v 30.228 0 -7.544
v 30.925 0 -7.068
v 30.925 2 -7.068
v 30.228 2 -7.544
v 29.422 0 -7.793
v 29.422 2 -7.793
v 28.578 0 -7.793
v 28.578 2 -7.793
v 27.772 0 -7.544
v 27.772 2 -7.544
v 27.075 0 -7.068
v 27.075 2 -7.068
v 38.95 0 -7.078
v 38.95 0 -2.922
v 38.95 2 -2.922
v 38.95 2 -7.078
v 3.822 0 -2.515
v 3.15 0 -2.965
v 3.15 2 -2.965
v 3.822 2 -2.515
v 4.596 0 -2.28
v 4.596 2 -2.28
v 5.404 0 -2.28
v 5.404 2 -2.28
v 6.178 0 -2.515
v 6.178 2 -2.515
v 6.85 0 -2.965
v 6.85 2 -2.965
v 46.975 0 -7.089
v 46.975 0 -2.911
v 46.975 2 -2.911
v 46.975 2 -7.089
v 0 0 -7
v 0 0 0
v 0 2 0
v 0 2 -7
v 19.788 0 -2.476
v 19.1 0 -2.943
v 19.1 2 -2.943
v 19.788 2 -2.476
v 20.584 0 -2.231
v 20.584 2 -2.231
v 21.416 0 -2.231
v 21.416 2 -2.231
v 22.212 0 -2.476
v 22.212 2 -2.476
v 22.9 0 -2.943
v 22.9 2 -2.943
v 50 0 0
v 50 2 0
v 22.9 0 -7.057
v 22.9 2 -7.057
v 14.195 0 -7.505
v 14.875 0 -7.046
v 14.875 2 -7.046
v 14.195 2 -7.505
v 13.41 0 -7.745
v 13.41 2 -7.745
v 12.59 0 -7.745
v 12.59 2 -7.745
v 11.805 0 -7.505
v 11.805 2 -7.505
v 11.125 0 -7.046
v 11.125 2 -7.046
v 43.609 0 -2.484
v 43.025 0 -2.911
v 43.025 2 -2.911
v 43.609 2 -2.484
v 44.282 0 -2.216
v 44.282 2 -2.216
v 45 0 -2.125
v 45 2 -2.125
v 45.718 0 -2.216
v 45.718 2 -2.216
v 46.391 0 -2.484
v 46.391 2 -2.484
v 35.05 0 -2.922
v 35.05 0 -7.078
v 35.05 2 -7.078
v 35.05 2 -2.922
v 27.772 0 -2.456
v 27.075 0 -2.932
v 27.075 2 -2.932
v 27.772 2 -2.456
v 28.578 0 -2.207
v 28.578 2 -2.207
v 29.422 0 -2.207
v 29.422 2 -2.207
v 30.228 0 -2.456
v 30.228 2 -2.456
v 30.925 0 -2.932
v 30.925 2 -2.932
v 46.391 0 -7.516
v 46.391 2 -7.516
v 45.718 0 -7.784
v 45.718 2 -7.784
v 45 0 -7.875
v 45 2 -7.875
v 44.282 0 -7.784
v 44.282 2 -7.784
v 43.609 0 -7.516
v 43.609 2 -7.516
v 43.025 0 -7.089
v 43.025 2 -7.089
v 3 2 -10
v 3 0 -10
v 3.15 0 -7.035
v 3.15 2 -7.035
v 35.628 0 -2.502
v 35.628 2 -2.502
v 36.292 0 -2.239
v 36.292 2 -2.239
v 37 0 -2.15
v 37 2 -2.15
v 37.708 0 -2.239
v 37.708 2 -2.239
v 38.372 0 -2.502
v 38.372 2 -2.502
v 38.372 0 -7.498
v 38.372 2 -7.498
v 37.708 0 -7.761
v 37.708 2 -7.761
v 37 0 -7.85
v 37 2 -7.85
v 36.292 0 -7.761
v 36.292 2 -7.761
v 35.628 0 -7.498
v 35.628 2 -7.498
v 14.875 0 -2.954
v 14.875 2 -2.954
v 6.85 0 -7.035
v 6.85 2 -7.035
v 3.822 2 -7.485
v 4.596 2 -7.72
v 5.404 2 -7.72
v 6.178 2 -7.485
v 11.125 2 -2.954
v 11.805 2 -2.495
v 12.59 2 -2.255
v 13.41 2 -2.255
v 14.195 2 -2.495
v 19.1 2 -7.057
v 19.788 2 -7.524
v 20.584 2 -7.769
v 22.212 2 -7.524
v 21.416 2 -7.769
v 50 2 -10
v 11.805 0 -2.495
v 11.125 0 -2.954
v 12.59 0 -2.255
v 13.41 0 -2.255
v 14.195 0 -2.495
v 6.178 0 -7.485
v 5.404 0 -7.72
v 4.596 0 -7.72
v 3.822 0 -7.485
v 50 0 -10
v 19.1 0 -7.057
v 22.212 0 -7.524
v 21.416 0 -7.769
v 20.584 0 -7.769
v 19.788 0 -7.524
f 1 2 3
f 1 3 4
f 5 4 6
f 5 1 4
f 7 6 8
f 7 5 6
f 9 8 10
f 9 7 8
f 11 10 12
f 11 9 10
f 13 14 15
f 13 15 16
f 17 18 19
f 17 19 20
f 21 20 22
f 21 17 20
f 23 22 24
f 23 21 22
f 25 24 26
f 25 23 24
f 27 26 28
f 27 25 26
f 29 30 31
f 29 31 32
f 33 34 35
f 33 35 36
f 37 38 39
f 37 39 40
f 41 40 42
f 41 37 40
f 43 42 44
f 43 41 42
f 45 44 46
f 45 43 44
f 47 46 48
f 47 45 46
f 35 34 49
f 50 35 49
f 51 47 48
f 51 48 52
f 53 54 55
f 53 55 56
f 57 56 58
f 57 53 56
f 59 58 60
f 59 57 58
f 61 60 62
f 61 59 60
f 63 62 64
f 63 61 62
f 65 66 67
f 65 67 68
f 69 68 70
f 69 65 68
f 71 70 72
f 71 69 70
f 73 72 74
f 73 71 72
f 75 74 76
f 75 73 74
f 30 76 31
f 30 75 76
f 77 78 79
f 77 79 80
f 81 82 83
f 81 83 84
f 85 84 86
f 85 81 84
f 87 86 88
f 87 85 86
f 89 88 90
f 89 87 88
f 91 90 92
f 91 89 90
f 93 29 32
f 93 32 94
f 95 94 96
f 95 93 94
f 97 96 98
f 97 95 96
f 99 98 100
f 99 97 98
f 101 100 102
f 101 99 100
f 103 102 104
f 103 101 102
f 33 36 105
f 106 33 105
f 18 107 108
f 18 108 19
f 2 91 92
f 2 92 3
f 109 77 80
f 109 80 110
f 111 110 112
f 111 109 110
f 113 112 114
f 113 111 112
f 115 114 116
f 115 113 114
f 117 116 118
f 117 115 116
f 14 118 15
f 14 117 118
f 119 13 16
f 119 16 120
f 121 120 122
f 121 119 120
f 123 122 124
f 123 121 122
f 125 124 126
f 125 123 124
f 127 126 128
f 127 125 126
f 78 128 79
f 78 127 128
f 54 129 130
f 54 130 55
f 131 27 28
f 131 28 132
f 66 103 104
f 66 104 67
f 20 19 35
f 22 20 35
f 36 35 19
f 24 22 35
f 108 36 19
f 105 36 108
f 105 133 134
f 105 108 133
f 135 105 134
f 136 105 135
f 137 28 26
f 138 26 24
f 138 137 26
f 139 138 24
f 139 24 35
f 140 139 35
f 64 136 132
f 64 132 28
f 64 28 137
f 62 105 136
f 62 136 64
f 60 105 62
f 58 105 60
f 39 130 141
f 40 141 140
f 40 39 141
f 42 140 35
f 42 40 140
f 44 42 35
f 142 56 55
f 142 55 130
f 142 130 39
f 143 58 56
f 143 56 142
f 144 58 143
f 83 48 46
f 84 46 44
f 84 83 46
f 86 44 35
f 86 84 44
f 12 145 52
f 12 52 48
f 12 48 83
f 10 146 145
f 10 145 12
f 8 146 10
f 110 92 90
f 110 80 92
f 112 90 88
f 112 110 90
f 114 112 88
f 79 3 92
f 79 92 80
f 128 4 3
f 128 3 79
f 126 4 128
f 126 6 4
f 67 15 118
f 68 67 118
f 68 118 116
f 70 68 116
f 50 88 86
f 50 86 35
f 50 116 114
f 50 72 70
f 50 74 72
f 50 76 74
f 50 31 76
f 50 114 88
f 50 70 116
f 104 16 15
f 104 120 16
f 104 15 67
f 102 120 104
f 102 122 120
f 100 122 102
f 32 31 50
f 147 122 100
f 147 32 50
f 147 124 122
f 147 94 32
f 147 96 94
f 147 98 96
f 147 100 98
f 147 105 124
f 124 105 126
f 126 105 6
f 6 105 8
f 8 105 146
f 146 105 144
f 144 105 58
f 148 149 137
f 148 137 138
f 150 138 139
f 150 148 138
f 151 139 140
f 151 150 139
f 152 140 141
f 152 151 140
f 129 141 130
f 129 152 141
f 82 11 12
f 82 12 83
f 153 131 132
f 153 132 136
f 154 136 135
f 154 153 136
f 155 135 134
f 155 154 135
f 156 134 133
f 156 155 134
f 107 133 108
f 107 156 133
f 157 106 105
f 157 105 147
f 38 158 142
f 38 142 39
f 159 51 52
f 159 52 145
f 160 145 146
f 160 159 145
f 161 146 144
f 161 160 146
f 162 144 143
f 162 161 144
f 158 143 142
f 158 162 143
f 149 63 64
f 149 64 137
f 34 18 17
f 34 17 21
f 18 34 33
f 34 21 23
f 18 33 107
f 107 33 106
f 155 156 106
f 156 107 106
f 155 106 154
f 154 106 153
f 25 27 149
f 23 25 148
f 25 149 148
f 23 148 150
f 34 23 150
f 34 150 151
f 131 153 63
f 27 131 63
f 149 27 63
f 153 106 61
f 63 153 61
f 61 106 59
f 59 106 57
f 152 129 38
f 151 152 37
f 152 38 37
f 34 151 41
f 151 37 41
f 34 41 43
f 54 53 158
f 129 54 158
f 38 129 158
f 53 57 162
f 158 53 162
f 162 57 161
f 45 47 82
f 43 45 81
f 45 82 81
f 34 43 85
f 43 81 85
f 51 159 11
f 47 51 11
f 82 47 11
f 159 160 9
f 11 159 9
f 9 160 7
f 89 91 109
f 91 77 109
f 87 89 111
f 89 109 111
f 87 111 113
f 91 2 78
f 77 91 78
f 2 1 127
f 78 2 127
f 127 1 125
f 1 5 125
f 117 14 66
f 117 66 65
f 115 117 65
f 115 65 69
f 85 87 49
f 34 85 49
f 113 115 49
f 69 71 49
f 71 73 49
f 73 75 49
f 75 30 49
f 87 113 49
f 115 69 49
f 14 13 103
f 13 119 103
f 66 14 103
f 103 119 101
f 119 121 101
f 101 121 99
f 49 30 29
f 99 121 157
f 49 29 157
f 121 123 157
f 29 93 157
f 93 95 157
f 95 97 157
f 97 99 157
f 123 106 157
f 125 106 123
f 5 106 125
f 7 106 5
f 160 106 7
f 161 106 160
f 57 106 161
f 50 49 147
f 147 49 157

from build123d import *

# Parameters (mm, degrees)
SKETCH1_W           = 50
SKETCH1_H           = 10
BOSS_EXTRUDE1_DEPTH = 2
CUT_EXTRUDE1_DEPTH  = 3


with BuildPart() as part:
    # Sketch1 → Boss-Extrude1 (new body)
    with BuildSketch(Plane(origin=(0, 0, 0), x_dir=(1, 0, 0), z_dir=(0, 1, 0))):
        with Locations((25, 5)):
            Rectangle(SKETCH1_W, SKETCH1_H)
        with BuildLine():
            Line((3.15, 7.034698995), (3.15, 2.965301005))
            ThreePointArc((3.15, 2.965301005), (5, 2.25), (6.85, 2.965301005))
            Line((6.85, 2.965301005), (6.85, 7.034698995))
            ThreePointArc((6.85, 7.034698995), (5, 7.75), (3.15, 7.034698995))
        make_face(mode=Mode.SUBTRACT)
        with BuildLine():
            Line((11.125, 7.045727255), (11.125, 2.954272745))
            ThreePointArc((11.125, 2.954272745), (13, 2.225), (14.875, 2.954272745))
            Line((14.875, 2.954272745), (14.875, 7.045727255))
            ThreePointArc((14.875, 7.045727255), (13, 7.775), (11.125, 7.045727255))
        make_face(mode=Mode.SUBTRACT)
        with BuildLine():
            Line((19.1, 7.05669638), (19.1, 2.94330362))
            ThreePointArc((19.1, 2.94330362), (21, 2.2), (22.9, 2.94330362))
            Line((22.9, 2.94330362), (22.9, 7.05669638))
            ThreePointArc((22.9, 7.05669638), (21, 7.8), (19.1, 7.05669638))
        make_face(mode=Mode.SUBTRACT)
        with BuildLine():
            Line((27.075, 7.067607313), (27.075, 2.932392687))
            ThreePointArc((27.075, 2.932392687), (29, 2.175), (30.925, 2.932392687))
            Line((30.925, 2.932392687), (30.925, 7.067607313))
            ThreePointArc((30.925, 7.067607313), (29, 7.825), (27.075, 7.067607313))
        make_face(mode=Mode.SUBTRACT)
        with BuildLine():
            Line((38.95, 2.921539031), (38.95, 7.078460969))
            ThreePointArc((38.95, 7.078460969), (37, 7.85), (35.05, 7.078460969))
            Line((35.05, 7.078460969), (35.05, 2.921539031))
            ThreePointArc((35.05, 2.921539031), (37, 2.15), (38.95, 2.921539031))
        make_face(mode=Mode.SUBTRACT)
        with BuildLine():
            Line((46.975, 2.910741758), (46.975, 7.089258242))
            ThreePointArc((46.975, 7.089258242), (45, 7.875), (43.025, 7.089258242))
            Line((43.025, 7.089258242), (43.025, 2.910741758))
            ThreePointArc((43.025, 2.910741758), (45, 2.125), (46.975, 2.910741758))
        make_face(mode=Mode.SUBTRACT)
    extrude(amount=BOSS_EXTRUDE1_DEPTH)

    # Sketch2 → Cut-Extrude1 (cut, through all)
    with BuildSketch(Plane(origin=(0, 2, 0), x_dir=(1, 0, 0), z_dir=(0, 1, 0))):
        Polygon((0, 7), (3, 10), (0, 10), align=None)
    extrude(amount=-CUT_EXTRUDE1_DEPTH, mode=Mode.SUBTRACT)


solid = part.part
